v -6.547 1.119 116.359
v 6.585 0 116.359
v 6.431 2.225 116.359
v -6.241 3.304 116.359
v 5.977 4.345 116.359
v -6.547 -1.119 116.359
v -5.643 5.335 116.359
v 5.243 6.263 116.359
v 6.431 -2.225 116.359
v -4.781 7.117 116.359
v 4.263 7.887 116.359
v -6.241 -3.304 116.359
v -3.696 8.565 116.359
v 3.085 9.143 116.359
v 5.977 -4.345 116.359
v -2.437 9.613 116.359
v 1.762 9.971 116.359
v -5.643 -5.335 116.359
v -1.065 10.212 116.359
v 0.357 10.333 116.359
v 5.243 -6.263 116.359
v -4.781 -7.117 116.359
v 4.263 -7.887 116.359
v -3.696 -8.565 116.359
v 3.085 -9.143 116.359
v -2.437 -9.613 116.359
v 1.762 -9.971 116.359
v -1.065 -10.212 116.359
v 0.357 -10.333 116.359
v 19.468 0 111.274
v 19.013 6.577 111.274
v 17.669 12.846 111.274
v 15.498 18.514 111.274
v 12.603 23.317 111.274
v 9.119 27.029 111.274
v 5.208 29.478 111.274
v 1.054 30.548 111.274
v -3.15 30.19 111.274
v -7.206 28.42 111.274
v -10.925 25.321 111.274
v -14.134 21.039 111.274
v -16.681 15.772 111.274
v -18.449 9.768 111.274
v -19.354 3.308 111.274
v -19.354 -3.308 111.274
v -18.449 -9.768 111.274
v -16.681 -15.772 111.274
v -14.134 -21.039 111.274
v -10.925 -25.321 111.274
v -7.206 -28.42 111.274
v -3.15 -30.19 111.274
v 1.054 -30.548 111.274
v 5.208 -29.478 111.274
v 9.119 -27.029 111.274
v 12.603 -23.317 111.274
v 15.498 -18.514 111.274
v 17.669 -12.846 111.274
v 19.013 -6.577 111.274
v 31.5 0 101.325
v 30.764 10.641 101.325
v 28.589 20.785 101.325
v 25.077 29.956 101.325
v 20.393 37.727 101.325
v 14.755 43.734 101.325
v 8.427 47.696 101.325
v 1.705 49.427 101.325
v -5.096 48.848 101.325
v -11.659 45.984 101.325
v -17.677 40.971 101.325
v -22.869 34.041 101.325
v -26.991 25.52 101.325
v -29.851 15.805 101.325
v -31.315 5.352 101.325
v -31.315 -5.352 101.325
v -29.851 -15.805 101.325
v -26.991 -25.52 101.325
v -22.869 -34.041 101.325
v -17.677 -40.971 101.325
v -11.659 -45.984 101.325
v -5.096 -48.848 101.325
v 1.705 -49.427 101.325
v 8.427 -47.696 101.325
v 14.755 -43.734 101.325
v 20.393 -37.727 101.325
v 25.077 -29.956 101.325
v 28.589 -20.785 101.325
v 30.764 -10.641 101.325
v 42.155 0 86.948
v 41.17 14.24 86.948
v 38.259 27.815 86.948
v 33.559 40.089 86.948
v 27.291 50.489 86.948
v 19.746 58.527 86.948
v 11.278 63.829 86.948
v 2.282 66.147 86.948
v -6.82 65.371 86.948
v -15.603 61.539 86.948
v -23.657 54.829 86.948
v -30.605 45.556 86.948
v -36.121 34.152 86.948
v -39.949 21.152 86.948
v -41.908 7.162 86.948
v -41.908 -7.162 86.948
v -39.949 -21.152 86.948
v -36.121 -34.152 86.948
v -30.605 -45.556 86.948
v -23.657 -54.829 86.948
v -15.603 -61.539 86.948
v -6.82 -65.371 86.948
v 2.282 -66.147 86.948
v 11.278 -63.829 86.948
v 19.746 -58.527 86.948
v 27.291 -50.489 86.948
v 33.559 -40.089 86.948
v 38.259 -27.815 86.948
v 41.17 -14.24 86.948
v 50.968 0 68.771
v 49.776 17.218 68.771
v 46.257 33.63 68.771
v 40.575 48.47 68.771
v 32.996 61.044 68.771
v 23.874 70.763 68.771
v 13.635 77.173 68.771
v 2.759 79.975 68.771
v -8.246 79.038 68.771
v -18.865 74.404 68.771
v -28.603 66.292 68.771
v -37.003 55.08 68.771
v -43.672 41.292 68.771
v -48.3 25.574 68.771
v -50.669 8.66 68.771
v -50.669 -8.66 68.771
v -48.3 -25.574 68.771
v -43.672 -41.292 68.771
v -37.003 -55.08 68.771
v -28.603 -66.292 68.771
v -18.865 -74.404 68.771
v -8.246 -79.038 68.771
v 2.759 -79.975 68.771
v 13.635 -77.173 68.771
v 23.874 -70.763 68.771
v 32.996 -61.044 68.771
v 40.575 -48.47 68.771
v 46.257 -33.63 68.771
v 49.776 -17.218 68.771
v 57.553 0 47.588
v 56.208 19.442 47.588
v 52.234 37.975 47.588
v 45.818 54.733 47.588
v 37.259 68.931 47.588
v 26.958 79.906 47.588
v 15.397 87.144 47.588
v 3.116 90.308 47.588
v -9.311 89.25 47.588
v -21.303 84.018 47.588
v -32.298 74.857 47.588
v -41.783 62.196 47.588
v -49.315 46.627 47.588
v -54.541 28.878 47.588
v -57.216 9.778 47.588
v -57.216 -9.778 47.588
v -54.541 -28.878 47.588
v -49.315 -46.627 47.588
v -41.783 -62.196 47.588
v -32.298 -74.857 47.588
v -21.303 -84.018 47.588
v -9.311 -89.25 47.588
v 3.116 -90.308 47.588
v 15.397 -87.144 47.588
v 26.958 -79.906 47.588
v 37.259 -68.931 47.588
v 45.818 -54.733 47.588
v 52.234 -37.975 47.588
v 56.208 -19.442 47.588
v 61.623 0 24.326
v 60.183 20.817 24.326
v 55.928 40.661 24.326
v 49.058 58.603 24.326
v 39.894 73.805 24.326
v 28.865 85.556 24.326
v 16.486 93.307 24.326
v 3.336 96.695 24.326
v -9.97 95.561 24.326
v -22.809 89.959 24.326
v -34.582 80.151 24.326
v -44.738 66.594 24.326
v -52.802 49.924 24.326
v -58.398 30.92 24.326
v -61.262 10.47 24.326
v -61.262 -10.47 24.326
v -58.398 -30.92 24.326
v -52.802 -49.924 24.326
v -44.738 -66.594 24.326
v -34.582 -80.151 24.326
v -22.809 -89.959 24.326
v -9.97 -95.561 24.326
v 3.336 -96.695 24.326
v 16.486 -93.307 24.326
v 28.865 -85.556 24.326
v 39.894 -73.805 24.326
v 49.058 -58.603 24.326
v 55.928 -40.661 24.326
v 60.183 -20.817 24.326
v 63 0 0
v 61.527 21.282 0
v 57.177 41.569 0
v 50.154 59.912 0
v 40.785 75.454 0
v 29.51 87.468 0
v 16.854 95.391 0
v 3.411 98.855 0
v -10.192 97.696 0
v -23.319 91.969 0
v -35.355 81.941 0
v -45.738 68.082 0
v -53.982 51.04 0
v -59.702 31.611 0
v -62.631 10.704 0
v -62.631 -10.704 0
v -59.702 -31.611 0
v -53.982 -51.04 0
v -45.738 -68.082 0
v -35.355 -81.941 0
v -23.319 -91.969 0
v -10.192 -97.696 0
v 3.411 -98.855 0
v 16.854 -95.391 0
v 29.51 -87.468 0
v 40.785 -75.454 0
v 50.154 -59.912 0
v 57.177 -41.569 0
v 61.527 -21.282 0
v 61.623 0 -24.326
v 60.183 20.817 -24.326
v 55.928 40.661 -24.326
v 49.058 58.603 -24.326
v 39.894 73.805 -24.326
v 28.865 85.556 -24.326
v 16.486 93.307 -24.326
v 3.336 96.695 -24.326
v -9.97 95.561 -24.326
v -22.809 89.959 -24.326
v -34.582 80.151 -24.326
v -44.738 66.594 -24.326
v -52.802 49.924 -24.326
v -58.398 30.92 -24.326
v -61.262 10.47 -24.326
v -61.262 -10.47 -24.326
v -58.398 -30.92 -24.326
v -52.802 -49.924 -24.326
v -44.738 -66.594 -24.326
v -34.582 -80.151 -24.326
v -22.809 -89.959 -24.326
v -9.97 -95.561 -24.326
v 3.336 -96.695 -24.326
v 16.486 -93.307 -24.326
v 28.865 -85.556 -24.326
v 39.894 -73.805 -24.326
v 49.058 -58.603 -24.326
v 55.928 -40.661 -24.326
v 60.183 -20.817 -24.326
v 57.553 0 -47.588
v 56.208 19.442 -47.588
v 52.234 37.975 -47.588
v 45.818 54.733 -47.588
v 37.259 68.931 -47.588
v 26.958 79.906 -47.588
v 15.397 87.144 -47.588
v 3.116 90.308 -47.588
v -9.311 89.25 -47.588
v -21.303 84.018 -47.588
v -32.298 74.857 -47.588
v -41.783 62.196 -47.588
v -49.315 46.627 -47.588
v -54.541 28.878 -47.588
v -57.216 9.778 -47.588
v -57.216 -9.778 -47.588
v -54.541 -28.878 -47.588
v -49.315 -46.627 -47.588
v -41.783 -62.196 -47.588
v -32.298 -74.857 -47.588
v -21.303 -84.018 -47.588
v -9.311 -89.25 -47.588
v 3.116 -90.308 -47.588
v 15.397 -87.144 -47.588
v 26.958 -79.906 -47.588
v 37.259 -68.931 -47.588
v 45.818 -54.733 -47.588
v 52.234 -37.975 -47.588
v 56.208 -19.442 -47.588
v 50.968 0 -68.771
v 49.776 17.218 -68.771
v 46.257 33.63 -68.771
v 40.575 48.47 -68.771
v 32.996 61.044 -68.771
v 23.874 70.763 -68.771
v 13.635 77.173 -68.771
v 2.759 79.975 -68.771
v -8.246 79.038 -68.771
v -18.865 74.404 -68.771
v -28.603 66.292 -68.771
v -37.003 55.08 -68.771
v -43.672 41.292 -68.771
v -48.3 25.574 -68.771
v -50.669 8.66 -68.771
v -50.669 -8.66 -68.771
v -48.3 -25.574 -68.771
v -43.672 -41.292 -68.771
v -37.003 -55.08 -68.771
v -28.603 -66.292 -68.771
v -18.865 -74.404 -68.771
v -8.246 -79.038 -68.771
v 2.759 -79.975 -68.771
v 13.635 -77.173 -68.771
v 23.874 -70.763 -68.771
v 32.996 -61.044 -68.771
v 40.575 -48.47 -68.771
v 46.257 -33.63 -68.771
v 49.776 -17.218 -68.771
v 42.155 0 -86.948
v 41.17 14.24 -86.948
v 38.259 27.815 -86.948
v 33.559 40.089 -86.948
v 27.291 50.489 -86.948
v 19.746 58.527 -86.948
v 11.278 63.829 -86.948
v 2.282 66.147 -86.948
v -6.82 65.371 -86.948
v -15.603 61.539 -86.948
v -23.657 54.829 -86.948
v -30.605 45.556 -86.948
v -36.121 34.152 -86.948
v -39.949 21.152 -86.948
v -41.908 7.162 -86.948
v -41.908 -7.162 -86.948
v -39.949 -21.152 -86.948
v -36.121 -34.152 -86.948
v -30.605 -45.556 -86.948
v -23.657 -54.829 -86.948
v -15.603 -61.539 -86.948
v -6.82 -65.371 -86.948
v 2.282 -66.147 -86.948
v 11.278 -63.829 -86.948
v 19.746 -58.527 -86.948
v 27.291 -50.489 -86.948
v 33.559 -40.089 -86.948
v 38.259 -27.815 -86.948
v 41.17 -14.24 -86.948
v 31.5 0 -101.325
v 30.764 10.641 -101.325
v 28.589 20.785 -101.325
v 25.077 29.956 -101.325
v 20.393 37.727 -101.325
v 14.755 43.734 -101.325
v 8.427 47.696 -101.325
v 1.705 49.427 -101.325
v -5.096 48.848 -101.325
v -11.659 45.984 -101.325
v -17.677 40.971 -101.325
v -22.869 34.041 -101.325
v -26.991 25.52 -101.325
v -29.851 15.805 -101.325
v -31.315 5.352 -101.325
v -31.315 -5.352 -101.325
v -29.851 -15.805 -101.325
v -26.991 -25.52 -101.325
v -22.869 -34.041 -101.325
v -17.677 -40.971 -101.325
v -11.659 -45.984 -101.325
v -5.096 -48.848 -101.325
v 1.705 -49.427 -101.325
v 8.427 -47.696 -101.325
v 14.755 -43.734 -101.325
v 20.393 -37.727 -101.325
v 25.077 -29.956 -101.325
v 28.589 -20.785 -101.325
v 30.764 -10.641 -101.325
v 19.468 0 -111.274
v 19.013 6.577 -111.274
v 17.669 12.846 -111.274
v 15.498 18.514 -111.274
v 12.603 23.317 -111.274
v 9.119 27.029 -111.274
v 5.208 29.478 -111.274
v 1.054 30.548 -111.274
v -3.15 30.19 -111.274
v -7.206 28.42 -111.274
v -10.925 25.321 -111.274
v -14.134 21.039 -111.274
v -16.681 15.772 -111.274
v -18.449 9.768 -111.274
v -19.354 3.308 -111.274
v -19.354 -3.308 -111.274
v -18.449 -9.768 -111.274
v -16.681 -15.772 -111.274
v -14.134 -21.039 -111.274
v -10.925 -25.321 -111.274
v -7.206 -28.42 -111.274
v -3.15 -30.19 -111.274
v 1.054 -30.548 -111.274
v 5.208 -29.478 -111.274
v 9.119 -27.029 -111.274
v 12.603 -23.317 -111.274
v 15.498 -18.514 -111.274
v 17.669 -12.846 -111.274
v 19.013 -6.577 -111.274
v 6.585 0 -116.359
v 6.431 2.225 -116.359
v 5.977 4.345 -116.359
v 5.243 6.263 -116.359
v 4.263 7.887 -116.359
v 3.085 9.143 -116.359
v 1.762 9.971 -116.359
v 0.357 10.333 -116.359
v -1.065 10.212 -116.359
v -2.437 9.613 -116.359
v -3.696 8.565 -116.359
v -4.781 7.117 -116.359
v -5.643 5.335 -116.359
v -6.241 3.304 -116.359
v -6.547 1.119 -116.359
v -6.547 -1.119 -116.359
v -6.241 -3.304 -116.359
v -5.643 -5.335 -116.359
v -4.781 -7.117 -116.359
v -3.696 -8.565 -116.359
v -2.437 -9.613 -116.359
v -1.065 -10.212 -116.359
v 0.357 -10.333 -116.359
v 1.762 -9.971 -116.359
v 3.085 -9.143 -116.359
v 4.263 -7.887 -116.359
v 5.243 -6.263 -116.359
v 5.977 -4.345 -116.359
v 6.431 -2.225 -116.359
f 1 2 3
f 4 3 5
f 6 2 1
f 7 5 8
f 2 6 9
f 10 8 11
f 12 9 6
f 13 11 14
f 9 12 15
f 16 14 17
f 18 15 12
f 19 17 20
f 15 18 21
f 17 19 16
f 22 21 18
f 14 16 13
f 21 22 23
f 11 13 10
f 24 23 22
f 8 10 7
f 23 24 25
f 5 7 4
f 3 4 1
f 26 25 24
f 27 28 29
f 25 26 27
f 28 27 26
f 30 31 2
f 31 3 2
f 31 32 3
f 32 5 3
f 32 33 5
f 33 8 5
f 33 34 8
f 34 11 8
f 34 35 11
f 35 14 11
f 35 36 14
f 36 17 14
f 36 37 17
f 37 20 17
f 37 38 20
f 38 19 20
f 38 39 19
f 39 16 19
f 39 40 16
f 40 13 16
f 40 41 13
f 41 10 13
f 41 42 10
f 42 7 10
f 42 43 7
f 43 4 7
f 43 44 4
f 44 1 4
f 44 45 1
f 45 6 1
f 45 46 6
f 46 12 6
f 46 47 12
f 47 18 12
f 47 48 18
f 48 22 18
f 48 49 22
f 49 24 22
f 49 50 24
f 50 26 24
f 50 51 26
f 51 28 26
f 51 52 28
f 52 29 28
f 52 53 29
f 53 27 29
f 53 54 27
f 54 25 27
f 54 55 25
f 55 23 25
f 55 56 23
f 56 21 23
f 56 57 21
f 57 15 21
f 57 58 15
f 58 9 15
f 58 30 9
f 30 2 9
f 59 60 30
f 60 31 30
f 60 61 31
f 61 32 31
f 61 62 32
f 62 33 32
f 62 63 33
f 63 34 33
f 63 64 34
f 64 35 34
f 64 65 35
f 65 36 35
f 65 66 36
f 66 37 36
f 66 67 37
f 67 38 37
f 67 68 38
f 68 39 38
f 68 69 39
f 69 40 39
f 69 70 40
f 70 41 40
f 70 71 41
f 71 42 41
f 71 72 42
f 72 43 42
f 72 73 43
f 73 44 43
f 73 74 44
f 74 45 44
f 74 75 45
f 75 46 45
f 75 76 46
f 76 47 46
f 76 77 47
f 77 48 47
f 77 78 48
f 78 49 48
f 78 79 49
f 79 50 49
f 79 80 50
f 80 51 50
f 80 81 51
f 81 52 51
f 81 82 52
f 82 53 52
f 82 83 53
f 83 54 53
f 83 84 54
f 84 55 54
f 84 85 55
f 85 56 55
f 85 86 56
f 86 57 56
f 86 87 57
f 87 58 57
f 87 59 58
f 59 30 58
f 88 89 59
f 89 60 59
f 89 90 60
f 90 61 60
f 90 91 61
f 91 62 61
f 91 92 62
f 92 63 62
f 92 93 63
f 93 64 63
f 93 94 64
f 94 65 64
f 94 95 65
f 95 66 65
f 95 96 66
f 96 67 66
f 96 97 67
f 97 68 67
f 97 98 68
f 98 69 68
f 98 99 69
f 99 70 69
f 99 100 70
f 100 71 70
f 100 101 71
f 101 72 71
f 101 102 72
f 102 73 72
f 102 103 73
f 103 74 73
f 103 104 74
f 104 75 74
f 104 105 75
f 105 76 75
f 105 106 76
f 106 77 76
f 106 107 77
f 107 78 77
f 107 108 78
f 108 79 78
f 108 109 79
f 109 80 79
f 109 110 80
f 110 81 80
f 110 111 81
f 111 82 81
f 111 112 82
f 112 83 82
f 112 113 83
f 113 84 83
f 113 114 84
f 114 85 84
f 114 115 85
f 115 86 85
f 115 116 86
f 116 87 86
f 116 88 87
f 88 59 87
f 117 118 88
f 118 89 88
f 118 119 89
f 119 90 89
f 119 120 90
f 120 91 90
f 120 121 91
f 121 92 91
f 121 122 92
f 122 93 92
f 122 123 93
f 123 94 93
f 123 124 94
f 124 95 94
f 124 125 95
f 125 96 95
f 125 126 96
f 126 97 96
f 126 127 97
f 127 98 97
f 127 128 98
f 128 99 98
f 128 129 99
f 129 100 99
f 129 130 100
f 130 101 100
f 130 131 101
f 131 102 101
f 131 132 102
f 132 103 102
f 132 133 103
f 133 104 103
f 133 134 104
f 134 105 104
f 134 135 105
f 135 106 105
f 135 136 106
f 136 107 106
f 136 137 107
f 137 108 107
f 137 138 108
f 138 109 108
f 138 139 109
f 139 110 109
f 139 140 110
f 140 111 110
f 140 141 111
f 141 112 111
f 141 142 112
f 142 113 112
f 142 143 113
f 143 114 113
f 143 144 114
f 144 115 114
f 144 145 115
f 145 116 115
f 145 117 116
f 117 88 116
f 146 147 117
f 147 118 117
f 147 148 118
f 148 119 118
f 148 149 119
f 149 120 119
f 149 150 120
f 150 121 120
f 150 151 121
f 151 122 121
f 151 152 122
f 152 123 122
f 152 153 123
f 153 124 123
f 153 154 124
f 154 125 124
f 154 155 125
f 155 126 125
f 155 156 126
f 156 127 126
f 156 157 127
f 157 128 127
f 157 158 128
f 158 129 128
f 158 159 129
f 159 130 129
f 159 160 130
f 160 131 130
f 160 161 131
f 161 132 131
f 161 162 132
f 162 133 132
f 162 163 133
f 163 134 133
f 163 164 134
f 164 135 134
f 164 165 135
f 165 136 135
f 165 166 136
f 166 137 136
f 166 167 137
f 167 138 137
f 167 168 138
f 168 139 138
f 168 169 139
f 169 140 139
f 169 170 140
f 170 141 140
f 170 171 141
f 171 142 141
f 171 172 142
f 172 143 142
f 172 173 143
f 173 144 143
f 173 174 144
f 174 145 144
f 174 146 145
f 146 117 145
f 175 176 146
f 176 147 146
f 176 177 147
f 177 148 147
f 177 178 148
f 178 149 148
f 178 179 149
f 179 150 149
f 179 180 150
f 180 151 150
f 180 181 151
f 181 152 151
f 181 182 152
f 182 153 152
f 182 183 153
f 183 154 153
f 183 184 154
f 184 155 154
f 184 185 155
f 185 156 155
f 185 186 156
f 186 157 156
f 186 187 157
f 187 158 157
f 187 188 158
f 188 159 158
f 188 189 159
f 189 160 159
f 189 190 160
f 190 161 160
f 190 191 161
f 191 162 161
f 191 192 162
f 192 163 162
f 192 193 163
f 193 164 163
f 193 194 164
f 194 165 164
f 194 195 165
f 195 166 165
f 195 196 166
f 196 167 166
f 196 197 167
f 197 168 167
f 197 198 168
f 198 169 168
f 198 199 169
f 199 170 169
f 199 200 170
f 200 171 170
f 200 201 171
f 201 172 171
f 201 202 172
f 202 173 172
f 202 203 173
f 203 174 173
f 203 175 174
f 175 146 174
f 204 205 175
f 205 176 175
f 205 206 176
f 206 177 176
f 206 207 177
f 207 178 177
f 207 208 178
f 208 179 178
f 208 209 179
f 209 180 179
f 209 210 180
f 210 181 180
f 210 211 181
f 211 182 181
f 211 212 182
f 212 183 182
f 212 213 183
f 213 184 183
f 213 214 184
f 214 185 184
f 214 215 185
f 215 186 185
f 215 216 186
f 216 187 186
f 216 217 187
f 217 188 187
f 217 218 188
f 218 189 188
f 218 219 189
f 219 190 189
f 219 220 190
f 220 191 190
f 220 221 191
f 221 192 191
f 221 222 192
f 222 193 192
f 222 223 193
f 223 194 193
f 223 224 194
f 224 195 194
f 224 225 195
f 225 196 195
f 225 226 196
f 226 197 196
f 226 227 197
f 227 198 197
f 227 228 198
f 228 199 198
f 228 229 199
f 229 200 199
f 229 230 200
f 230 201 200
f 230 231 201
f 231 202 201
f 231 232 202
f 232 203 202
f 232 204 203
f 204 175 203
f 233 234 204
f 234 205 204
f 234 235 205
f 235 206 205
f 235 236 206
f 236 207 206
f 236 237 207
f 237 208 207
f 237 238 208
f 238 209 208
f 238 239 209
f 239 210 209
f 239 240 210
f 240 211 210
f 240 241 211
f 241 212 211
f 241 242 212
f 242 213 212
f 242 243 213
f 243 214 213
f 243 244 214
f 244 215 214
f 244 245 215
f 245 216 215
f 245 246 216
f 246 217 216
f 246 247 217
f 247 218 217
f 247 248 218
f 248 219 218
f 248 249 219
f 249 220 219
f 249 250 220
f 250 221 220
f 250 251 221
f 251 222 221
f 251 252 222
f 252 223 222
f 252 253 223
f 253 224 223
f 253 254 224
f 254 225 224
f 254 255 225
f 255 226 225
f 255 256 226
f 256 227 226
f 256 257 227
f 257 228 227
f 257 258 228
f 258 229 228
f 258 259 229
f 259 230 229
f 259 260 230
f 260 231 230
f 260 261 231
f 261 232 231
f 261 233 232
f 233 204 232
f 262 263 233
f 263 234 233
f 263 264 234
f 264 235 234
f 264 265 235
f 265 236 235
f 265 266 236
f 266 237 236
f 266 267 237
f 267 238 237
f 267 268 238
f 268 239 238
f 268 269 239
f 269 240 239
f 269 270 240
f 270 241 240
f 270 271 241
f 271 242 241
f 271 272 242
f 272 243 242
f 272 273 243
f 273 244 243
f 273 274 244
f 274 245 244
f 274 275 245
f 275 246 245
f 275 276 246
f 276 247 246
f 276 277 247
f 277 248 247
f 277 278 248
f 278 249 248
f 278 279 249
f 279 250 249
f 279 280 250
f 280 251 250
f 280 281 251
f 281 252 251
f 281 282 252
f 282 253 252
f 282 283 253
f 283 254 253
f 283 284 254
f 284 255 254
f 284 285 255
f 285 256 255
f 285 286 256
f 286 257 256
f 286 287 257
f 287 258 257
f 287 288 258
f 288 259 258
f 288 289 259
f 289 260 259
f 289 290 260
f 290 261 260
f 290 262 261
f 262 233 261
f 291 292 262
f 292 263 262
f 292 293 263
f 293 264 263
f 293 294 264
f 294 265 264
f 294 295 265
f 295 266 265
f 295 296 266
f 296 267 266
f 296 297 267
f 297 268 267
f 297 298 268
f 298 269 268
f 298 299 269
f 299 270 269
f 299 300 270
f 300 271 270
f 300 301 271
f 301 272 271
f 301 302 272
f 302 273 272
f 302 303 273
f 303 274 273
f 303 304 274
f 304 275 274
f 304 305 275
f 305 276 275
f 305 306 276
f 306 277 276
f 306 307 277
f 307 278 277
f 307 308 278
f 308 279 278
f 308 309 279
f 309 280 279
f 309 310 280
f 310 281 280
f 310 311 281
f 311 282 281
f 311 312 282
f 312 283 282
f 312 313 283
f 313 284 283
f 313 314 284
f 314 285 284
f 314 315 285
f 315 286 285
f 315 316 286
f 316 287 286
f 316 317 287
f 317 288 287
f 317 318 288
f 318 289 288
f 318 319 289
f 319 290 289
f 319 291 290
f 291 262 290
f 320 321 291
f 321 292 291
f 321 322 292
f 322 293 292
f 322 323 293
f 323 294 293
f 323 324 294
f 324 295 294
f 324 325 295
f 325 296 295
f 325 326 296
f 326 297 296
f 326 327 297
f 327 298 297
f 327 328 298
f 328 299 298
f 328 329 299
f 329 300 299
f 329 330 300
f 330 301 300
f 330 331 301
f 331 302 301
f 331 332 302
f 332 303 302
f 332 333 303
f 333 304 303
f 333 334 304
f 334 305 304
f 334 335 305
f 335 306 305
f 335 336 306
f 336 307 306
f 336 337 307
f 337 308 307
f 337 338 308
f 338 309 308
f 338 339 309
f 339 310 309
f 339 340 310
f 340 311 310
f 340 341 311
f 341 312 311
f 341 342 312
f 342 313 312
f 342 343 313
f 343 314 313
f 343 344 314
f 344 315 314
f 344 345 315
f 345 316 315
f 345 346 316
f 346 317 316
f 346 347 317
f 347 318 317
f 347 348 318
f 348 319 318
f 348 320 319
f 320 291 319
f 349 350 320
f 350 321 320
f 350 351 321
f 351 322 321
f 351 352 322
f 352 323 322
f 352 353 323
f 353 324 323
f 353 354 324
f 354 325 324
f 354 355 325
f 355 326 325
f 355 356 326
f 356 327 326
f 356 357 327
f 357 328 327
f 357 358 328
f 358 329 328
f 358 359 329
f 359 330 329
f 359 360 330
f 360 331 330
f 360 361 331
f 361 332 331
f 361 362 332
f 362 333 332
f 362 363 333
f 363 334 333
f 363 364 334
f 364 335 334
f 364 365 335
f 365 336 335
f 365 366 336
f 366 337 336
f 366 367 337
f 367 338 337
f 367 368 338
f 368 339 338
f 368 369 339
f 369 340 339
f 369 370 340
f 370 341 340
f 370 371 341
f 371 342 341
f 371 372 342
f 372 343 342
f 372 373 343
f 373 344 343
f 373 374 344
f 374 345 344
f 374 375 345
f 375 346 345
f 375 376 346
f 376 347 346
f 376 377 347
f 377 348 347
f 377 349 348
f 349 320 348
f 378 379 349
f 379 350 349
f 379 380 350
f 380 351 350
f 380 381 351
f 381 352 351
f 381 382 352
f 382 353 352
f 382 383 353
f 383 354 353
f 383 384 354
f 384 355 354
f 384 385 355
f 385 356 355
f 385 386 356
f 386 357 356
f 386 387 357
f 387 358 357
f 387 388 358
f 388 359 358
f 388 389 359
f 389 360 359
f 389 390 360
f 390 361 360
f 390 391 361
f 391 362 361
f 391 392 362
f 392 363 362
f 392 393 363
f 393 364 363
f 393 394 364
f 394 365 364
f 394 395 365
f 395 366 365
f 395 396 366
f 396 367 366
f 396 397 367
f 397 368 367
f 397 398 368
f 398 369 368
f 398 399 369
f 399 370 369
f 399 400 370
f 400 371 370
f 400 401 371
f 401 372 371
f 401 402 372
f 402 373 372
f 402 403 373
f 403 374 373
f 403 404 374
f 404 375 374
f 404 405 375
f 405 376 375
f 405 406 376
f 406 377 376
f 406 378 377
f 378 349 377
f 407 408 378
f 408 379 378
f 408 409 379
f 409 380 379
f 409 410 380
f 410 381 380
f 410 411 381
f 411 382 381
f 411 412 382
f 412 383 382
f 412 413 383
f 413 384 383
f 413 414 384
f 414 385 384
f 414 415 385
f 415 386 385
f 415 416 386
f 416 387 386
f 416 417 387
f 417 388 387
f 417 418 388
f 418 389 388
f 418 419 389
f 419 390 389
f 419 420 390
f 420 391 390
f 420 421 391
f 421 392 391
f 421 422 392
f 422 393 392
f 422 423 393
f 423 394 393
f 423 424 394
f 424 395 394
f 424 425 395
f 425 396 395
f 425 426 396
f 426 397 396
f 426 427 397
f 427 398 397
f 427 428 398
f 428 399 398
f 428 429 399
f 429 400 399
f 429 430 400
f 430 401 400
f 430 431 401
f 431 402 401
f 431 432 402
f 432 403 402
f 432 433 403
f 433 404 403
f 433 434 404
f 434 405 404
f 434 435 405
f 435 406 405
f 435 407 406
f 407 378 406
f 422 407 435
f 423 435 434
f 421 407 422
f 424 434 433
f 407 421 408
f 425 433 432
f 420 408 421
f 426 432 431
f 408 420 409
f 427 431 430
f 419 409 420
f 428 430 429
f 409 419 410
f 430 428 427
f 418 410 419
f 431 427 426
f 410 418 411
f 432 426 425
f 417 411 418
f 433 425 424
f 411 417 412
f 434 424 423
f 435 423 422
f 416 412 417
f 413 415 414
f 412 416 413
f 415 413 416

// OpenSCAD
// Generated by SolidPython 1.0.1 on 2020-07-29 00:46:47


scale(v = [7, 11, 13]) {
	sphere(r = 9);
}
/***********************************************
*********      SolidPython code:      **********
************************************************
 
# import packages: SolidPython
from solid import *
from solid.utils import *
from itertools import chain, combinations, permutations


class Resize:

    def __init__(self, scad_file):
        self.scad_file = scad_file
        #self.scad_file = import_scad(scad_file)
        # cone/cylinder param:
        self.r1 = 0
        self.r2 = 0
        self.h = 0
        # rectangular prism param:
        self.w = 0
        self.l = 0
        # ellipse param:
        self.r = 0

    # import OpenScad code (file name corresponds to shape)


    # classify shape + parameters
    def assign(self, param1, param2, param3):
        if self.scad_file == 'cone.scad':
            self.r1 = param1
            self.r2 = param2
            self.h = param3
        elif self.scad_file == 'cylinder.scad':
            self.r1 = param1
            self.r2 = param2
            self.h = param3
        elif self.scad_file == 'rectangularPrism.scad':
            self.h = param1
            self.l = param2
            self.w = param3
        else:
            self.r = param1
            self.h = param2

    # resize parameters
    def iterate(self):
        x = range(3, 20, 2)
        i = 1
        if self.scad_file == 'cone.scad':
            tempList = list(permutations(x, 2))
            for temp in tempList:
                param1 = temp[0]
                param2 = temp[1]
                filepath = 'produced_scad_files/' + 'cone' + str(param1) + '_' + str(param2) + '_' + '.scad'
                scad_render_to_file(cylinder(h=param1, r1=param2, r2=0), filepath)

        elif self.scad_file == 'cylinder.scad':
            tempList = list(permutations(x, 3))
            for temp in tempList:
                param1 = temp[0]
                param2 = temp[1]
                filepath = 'produced_scad_files/' + 'cylinder' + str(param1) + '_' + str(param2) + '_' + '.scad'
                scad_render_to_file(cylinder(h=param1, r1=param2, r2=param2), filepath)

        elif self.scad_file == 'rectangularPrism.scad':
            tempList = list(permutations(x, 3))
            for temp in tempList:
                param1 = temp[0]
                param2 = temp[1]
                param3 = temp[2]
                filepath = 'produced_scad_files/' + 'rectangularPrism' + str(param1) + '_' + str(param2) + '_' + str(
                    param3) + '.scad'
                scad_render_to_file(cube(size=(param1, param2, param3)), filepath)

        elif self.scad_file == 'ellipse.scad':
            tempList = list(permutations(x, 4))
            for temp in tempList:
                param1 = temp[0]
                param2 = temp[1]
                param3 = temp[2]
                param4 = temp[3]
                filepath = 'produced_scad_files/' + 'ellipse' + str(param1) + '_' + str(param2) + '_' + str(param3) + '_' + str(param4) + '.scad'
                scad_render_to_file(scale([param1, param2, param3])(sphere(r=param4)), filepath)

    def render_to_scadfile(self):
        scad_render_to_file(scad, 'example.scad') 
 
************************************************/
